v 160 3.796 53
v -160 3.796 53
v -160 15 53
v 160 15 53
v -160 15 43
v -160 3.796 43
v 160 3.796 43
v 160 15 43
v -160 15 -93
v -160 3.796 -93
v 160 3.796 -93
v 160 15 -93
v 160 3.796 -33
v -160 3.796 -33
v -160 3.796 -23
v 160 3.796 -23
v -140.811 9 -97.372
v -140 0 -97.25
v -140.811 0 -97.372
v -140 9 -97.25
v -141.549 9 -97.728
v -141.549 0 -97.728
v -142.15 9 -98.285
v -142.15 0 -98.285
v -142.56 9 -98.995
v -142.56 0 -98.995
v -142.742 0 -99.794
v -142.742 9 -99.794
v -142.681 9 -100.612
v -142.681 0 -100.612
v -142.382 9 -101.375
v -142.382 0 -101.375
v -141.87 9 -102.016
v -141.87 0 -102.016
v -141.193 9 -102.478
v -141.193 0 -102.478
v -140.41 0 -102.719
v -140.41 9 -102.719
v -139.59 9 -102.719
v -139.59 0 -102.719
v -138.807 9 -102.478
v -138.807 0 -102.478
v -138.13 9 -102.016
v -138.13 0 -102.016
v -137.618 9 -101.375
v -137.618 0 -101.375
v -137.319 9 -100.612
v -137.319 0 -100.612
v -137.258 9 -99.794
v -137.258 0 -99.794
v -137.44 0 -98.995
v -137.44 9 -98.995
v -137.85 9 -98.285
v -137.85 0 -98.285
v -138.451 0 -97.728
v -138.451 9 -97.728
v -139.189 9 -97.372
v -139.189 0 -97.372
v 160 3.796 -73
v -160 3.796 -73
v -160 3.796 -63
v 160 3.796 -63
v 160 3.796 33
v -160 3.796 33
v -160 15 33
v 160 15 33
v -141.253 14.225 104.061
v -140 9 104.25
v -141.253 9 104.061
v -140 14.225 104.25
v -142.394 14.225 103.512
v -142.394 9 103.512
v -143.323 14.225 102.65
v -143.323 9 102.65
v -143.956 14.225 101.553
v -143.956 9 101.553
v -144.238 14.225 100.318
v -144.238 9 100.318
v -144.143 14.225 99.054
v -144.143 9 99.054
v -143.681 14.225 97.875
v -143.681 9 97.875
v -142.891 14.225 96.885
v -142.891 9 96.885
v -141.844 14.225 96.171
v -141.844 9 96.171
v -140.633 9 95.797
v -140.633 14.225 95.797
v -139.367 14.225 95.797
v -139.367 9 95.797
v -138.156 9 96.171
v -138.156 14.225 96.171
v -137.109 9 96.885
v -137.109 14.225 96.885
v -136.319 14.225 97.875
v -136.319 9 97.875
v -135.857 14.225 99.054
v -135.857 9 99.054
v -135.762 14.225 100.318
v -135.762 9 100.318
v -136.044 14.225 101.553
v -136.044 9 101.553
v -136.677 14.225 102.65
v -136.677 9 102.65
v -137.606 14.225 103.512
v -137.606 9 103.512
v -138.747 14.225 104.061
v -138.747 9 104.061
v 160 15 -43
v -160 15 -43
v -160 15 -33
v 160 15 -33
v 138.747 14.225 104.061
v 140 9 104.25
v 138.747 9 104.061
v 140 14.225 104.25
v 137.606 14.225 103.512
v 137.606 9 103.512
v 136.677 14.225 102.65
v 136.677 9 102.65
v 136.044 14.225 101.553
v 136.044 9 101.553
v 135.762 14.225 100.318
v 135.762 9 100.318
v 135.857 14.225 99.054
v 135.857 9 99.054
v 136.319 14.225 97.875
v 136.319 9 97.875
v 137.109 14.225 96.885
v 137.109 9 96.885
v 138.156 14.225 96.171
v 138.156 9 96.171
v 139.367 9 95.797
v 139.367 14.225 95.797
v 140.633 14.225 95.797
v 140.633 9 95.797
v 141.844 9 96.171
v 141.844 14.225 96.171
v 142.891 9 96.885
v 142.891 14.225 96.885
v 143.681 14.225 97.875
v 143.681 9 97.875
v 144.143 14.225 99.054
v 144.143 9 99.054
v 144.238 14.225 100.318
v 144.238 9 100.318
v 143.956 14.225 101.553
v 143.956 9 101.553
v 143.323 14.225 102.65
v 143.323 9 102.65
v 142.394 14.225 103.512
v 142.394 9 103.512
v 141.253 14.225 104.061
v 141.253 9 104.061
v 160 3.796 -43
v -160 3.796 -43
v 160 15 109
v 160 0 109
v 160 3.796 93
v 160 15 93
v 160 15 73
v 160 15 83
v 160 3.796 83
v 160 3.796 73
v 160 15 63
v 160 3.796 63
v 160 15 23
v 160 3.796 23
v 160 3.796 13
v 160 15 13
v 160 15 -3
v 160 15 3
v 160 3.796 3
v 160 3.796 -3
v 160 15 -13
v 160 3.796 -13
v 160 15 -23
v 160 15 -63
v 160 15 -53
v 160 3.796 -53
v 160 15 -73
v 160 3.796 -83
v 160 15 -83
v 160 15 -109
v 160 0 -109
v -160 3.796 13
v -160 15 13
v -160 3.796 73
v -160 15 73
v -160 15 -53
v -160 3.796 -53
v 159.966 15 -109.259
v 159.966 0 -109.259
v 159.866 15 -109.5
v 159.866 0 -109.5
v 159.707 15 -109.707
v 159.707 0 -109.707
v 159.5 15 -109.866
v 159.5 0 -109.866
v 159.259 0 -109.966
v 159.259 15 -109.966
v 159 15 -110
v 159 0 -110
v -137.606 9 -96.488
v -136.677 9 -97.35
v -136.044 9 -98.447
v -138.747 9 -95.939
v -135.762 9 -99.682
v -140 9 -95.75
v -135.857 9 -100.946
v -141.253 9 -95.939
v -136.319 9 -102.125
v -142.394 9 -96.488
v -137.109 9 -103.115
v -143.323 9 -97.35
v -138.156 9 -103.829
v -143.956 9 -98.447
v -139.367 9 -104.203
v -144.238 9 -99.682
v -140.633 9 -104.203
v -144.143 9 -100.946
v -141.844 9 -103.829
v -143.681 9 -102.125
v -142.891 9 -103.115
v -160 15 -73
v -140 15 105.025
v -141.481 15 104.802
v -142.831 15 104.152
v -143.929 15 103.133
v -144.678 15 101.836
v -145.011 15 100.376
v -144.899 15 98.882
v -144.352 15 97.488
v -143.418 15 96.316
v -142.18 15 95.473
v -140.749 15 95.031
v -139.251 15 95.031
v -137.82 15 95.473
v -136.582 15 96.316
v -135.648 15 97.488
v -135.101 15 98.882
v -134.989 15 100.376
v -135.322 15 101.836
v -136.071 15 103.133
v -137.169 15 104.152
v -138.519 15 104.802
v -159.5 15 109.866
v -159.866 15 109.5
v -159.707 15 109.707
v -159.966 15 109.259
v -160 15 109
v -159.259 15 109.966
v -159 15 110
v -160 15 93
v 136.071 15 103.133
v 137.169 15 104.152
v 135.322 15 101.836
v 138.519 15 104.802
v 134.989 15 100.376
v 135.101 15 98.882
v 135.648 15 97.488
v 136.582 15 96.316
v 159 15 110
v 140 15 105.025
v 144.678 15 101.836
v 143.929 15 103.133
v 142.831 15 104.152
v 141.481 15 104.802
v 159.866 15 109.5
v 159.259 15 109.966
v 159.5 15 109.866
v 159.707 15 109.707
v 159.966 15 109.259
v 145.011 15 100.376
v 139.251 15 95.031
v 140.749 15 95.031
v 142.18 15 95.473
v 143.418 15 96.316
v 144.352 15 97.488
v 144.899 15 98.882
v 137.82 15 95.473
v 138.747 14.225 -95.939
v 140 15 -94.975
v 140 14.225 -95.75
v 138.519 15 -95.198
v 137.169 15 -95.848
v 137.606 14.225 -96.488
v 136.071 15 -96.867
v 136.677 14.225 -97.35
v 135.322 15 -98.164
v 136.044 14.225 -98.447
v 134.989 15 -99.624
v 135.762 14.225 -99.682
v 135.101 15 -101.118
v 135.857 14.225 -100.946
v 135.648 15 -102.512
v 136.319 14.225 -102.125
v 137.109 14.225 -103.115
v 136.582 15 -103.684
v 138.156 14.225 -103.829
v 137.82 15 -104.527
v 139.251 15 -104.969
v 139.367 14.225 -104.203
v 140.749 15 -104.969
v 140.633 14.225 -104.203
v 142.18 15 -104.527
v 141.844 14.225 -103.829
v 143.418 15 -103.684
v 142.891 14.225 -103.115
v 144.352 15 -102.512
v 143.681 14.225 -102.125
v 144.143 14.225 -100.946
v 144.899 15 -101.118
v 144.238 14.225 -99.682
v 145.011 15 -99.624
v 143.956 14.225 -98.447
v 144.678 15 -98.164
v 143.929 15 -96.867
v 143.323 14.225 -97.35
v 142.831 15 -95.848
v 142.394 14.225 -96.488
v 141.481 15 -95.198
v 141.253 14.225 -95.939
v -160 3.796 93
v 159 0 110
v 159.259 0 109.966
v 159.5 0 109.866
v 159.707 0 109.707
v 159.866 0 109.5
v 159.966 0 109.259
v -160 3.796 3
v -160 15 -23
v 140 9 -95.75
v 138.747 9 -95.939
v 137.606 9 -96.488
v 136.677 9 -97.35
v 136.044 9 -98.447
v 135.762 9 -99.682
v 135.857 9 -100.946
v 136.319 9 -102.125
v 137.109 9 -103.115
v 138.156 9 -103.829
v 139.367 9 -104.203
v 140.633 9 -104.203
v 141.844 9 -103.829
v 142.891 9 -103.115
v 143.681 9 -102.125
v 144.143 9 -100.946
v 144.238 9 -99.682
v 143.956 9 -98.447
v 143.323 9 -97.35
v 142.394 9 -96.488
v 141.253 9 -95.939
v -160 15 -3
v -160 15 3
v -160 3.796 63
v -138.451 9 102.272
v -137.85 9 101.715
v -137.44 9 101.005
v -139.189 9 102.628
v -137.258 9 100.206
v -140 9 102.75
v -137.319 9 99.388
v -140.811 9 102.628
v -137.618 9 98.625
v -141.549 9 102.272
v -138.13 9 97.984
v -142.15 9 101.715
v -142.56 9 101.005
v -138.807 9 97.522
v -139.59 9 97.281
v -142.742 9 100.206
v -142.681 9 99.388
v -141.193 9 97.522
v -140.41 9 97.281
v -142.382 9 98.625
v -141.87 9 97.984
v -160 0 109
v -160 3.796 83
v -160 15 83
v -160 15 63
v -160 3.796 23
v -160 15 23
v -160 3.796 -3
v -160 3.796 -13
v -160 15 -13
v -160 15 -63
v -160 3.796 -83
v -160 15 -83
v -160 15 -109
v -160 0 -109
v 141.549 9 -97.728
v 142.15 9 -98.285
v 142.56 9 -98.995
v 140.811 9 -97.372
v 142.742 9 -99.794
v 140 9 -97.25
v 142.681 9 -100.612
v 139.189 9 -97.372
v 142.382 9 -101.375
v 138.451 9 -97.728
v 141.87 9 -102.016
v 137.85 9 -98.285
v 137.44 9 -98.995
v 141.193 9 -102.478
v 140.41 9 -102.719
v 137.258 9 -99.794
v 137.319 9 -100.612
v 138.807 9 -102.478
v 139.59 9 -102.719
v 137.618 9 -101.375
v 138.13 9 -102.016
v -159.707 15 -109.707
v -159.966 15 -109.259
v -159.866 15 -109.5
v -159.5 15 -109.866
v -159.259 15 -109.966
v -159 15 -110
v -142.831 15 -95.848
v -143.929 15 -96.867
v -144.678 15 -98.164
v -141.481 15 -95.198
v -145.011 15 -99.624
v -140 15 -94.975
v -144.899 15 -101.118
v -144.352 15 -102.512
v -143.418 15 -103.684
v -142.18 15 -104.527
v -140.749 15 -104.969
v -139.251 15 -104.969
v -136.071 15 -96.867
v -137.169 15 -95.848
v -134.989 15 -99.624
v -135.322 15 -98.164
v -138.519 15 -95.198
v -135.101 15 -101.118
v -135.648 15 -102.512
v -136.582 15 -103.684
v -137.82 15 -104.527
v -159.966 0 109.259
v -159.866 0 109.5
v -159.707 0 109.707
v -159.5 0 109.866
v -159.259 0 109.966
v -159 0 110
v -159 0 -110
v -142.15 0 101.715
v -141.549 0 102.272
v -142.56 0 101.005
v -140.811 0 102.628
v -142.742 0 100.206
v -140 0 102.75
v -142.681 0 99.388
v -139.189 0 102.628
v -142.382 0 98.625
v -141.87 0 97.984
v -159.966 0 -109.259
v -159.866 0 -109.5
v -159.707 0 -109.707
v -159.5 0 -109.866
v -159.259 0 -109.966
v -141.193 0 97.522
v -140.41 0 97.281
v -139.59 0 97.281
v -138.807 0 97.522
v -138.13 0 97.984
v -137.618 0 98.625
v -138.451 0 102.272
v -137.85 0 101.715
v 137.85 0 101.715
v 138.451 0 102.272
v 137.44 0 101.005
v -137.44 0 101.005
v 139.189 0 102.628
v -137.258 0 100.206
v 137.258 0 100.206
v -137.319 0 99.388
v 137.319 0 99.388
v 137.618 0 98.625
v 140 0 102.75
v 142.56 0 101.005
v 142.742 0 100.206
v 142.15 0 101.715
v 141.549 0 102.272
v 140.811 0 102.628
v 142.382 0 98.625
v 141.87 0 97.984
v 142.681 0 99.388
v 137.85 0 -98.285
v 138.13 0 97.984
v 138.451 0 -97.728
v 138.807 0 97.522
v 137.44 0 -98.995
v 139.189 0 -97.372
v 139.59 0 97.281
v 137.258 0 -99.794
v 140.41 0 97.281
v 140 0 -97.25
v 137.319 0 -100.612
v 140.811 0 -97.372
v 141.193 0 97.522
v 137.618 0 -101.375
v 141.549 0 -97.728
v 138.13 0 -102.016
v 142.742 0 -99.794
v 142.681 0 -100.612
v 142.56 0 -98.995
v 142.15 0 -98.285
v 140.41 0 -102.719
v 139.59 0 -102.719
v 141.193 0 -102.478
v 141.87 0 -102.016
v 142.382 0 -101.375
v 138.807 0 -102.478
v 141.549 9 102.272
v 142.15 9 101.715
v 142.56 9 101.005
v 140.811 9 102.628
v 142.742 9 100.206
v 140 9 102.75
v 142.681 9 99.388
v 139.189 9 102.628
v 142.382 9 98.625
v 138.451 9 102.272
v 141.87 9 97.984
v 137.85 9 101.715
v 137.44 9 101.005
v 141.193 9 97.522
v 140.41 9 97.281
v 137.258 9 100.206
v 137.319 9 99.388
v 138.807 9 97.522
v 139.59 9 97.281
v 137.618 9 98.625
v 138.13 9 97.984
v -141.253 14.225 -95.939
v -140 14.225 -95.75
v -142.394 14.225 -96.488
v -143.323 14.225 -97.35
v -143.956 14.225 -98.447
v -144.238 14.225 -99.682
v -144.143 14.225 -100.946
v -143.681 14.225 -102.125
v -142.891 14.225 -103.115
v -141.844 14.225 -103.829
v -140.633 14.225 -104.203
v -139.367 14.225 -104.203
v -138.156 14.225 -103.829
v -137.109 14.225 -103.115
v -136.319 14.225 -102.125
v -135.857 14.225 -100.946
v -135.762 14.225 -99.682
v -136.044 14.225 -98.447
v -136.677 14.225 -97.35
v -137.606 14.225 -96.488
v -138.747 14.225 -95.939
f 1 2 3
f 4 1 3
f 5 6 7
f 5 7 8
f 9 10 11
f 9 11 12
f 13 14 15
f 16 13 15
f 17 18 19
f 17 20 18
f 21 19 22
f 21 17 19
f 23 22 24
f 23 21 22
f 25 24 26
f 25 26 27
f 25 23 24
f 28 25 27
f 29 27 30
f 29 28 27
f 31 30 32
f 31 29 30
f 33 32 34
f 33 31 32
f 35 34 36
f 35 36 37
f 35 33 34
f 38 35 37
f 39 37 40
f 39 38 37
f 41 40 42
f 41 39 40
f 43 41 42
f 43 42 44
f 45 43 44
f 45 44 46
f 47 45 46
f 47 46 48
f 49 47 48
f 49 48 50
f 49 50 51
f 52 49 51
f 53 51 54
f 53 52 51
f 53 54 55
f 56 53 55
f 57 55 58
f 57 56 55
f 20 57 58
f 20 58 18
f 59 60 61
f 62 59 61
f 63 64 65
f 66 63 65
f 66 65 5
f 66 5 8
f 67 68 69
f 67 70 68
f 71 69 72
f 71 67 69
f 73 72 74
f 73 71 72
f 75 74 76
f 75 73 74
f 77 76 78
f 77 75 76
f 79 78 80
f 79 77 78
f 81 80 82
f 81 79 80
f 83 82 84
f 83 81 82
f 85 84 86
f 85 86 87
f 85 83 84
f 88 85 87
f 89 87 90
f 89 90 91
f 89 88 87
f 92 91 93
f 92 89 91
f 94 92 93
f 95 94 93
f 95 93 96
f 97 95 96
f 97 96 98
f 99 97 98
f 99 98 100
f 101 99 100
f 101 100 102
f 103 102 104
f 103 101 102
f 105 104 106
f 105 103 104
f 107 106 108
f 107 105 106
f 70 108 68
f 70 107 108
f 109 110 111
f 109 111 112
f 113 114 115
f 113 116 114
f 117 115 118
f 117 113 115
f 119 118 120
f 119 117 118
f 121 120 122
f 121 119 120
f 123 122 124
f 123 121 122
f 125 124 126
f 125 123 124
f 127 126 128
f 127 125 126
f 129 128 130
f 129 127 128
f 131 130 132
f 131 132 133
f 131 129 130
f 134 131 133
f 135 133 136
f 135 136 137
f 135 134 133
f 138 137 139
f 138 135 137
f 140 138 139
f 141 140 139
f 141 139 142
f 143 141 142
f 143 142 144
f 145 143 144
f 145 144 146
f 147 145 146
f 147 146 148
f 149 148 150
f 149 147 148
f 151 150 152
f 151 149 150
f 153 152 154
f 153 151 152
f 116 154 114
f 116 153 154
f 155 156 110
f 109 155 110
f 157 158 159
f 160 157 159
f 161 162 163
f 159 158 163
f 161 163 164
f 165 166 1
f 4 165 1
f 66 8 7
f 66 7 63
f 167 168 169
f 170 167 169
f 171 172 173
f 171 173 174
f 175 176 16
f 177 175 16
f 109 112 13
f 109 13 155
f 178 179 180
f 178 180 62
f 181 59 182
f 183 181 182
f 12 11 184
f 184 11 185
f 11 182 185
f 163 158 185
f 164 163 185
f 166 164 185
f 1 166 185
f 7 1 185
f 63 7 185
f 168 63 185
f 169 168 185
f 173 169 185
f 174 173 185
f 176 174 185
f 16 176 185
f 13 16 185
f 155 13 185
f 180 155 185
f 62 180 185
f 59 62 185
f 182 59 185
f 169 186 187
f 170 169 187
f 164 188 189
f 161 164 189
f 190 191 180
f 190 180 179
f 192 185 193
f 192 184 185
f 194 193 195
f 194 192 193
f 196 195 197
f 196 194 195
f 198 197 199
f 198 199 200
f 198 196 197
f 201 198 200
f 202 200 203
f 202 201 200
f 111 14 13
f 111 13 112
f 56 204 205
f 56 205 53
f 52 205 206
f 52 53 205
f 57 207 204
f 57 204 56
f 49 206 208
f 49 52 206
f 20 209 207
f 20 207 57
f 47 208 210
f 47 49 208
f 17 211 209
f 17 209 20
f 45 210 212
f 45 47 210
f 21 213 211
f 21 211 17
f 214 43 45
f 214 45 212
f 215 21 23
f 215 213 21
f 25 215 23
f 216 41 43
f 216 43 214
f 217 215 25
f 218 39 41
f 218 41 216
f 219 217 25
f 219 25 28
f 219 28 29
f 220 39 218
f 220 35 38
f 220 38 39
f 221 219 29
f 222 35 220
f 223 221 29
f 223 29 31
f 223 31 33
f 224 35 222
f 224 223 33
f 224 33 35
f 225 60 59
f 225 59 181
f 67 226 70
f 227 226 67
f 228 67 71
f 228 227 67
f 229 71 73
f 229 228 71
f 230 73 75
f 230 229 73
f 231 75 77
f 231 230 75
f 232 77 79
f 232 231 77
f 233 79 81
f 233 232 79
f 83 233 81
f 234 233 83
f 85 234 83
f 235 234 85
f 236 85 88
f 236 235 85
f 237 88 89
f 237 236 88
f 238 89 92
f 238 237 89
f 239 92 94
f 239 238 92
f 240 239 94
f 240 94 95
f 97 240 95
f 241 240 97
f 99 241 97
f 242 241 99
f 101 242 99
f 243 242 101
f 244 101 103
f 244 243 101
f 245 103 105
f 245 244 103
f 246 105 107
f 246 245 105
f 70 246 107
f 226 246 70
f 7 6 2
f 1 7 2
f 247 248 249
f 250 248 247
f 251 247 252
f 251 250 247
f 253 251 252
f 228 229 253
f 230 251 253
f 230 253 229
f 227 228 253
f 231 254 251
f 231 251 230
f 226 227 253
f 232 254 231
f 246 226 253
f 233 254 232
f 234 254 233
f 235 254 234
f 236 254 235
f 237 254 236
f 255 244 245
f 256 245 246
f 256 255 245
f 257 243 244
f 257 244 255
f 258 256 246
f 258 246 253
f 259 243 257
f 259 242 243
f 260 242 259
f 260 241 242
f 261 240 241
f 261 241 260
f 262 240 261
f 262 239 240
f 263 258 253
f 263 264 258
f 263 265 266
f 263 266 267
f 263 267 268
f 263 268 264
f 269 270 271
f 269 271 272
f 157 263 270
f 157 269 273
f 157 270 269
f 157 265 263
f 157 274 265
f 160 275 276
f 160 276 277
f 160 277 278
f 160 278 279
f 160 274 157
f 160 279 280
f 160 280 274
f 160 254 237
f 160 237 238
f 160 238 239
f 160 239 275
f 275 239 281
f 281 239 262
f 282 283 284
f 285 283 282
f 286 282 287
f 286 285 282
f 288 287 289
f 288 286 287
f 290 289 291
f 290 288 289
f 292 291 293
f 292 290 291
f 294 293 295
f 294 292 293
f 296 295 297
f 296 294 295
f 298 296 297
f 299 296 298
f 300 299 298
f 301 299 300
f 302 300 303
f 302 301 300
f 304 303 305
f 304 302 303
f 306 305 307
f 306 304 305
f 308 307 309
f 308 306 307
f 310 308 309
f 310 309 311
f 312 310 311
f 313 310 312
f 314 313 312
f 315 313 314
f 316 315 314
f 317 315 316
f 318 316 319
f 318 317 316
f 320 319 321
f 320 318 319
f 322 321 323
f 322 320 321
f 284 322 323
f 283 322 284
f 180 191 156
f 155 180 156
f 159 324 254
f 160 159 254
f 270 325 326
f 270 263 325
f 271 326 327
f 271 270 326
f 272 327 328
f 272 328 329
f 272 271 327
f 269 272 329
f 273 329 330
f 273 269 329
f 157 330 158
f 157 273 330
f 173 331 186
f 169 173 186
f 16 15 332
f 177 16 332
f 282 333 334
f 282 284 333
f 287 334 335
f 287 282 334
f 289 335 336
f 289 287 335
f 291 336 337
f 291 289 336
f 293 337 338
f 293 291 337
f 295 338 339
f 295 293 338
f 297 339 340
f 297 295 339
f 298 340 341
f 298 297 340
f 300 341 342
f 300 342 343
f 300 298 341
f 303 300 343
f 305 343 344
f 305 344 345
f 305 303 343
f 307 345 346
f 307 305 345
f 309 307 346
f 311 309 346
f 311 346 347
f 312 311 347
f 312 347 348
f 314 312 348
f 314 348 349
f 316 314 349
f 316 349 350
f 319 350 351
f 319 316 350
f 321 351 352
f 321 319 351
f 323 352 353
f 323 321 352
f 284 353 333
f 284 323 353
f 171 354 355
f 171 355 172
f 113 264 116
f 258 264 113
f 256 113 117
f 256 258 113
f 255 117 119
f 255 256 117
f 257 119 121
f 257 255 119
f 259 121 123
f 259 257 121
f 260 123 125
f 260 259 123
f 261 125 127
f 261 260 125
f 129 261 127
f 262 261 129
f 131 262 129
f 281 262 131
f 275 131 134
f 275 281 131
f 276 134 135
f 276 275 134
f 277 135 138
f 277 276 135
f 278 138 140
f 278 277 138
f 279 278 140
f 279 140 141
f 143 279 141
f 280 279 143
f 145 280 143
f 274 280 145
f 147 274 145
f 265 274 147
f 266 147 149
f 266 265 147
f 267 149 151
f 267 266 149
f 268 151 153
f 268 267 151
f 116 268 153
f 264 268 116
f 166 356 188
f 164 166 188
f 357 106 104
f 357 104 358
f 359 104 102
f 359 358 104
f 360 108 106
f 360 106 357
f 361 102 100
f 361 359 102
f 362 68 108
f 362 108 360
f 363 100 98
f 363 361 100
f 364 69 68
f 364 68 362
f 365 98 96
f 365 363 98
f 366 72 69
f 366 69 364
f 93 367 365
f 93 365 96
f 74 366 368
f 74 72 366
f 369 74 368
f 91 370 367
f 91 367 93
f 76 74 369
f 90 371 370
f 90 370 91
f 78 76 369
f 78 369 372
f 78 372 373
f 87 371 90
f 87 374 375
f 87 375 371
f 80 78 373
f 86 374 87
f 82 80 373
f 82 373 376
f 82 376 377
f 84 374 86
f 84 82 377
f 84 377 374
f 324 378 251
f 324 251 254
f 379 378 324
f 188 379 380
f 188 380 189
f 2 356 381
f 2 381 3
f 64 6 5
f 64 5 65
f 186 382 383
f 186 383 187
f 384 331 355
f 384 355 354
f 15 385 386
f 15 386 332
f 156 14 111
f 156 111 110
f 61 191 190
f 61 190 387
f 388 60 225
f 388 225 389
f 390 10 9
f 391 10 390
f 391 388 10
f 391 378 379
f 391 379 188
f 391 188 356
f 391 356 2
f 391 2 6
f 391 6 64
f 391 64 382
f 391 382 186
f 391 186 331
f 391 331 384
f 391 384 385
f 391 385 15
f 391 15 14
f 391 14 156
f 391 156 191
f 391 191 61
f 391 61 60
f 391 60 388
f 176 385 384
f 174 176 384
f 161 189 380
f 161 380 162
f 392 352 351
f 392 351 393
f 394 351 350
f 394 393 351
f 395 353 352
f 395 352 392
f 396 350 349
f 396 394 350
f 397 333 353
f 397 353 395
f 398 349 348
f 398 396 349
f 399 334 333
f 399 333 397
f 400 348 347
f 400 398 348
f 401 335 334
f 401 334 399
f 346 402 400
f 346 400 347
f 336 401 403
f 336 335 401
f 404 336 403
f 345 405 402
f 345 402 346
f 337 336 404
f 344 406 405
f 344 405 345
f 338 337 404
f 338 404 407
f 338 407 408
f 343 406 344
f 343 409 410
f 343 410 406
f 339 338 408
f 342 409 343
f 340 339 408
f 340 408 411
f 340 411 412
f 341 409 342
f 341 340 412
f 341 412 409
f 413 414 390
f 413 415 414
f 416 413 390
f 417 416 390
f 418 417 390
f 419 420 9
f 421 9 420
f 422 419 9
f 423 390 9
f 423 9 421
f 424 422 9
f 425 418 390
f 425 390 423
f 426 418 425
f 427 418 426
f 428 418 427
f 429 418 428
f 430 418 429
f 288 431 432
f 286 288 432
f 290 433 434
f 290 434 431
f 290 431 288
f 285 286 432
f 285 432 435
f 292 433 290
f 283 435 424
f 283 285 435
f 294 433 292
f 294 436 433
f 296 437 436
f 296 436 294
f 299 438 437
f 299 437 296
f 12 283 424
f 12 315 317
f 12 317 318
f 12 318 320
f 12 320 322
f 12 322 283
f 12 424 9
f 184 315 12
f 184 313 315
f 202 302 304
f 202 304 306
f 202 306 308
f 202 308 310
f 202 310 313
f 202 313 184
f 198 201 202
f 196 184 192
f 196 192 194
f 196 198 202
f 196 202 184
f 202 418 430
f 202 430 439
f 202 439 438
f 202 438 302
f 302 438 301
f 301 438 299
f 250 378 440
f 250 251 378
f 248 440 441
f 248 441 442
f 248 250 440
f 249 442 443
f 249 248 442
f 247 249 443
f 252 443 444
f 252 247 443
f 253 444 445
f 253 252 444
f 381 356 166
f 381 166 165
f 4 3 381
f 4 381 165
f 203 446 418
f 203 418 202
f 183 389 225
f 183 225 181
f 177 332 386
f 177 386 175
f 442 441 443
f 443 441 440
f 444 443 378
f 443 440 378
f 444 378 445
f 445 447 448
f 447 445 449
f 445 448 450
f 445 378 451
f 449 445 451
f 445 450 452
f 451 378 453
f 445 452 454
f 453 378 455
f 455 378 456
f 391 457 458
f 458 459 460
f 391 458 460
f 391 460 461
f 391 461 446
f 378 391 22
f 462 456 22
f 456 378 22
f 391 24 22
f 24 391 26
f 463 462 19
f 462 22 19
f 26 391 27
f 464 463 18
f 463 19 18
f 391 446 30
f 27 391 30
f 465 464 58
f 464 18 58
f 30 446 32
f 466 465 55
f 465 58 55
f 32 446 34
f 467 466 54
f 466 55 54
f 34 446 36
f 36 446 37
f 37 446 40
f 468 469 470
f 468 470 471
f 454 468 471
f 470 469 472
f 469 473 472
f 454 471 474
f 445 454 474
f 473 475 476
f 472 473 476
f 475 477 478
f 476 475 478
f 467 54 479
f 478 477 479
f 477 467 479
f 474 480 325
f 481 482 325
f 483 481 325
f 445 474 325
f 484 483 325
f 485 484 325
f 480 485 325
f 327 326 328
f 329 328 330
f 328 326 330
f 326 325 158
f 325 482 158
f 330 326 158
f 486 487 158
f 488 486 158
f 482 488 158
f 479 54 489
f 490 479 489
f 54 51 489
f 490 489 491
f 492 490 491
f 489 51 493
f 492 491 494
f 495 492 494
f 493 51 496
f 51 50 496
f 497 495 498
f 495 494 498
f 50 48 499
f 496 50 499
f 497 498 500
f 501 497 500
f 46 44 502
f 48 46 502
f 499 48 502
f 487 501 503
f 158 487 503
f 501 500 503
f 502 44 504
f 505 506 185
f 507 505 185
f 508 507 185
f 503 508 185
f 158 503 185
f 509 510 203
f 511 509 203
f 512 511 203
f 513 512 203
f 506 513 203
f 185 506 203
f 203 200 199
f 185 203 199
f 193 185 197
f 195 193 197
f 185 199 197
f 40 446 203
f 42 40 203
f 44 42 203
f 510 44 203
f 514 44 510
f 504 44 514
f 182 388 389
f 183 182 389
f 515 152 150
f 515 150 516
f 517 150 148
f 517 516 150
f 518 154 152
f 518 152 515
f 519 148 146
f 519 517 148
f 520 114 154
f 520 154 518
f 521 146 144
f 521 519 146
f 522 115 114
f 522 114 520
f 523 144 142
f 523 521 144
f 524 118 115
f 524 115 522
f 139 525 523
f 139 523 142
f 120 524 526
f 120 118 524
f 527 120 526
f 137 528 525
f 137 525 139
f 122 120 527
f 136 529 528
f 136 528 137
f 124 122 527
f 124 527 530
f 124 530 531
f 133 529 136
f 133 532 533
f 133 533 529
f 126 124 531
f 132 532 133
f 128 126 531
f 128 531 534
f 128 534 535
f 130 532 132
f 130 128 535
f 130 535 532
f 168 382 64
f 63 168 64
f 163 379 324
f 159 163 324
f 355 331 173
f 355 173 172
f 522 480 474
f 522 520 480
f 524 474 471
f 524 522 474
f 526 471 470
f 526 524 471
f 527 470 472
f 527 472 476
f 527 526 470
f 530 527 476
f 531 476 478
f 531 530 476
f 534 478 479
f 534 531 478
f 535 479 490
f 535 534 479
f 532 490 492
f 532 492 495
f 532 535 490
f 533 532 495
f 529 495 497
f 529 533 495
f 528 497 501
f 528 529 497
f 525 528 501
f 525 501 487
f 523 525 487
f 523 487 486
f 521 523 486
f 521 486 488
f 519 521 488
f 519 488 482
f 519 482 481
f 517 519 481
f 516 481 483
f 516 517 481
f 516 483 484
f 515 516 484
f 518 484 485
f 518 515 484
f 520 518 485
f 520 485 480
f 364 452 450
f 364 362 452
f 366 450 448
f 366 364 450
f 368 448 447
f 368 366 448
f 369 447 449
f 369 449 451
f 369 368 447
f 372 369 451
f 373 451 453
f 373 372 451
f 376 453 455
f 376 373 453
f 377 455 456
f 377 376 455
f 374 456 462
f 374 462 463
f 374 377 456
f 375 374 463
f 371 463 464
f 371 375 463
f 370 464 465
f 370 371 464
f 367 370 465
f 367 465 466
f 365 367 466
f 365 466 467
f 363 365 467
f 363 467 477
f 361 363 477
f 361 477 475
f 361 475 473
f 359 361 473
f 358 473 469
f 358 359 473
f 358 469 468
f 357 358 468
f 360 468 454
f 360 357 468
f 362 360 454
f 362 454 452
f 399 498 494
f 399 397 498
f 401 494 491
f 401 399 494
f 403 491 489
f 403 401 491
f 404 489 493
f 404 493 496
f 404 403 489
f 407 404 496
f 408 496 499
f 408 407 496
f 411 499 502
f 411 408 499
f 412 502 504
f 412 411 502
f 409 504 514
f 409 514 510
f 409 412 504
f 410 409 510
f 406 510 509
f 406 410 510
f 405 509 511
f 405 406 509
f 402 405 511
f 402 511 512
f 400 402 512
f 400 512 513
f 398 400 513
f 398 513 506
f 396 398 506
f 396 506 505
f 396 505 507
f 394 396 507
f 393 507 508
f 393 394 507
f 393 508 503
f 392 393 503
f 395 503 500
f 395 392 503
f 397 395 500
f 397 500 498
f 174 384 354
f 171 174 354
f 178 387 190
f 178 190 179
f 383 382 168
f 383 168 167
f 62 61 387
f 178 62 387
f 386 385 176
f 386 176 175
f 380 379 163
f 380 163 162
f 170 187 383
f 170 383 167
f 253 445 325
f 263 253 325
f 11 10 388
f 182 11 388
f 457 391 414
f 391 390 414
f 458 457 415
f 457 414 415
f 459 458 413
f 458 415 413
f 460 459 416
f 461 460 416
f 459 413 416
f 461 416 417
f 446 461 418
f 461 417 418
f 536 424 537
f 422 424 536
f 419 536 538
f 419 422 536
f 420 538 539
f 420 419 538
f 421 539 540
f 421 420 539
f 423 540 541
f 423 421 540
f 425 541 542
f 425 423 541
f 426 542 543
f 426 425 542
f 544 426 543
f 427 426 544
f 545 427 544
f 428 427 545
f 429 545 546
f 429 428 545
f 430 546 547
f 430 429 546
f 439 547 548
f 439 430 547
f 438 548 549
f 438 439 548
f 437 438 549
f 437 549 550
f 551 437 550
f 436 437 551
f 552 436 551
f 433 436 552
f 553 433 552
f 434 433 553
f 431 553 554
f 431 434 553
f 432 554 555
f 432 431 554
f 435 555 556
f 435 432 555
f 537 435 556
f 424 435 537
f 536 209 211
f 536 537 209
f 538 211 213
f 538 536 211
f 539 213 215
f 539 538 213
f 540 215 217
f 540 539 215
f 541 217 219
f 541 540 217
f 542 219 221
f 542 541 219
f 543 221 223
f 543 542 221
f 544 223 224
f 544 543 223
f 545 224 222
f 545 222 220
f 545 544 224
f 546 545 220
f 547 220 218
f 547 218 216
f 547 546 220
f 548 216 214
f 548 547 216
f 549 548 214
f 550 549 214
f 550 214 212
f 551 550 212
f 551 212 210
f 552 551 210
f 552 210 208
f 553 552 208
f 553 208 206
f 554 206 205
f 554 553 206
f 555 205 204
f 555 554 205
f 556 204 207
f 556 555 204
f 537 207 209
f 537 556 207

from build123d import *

# Parameters (mm, degrees)
SKETCH1_W                                    = 320
SKETCH1_H                                    = 220
BOSS_EXTRUDE1_DEPTH                          = 15
FILLET2_R                                    = 1
CBORE_FOR_M5_HEX_SOCKET_HEAD_CAP_SCR_2_COUNT = 2
CBORE_FOR_M5_HEX_SOCKET_HEAD_CAP_SCR_2_PITCH = 200
CBORE_FOR_M5_HEX_SOCKET_HEAD_CAP_SCR_3_COUNT = 2
CBORE_FOR_M5_HEX_SOCKET_HEAD_CAP_SCR_3_PITCH = 344.093010682
CBORE_FOR_M5_HEX_SOCKET_HEAD_CAP_SCR_4_COUNT = 2
CBORE_FOR_M5_HEX_SOCKET_HEAD_CAP_SCR_4_PITCH = 280
SKETCH7_W                                    = 10
SKETCH7_H                                    = 11.203973801
CUT_EXTRUDE1_DEPTH                           = 321


with BuildPart() as part:
    # Sketch1 → Boss-Extrude1 (new body)
    with BuildSketch(Plane(origin=(0, 0, 0), x_dir=(1, 0, 0), z_dir=(0, 1, 0))):
        Rectangle(SKETCH1_W, SKETCH1_H)
    extrude(amount=BOSS_EXTRUDE1_DEPTH)

    # Fillet2
    fillet2_edges = [part.edges().sort_by_distance(p)[0] for p in [
        (-160, 7.5, -110),
        (160, 7.5, -110),
        (160, 7.5, 110),
        (-160, 7.5, 110),
    ]]
    fillet(fillet2_edges, radius=FILLET2_R)

    # Sketch5 → CBORE for M5 Hex Socket Head Cap Screw2 (revolve, cut)
    with BuildSketch(Plane(origin=(-140, 15, -100), x_dir=(0, 0, 1), z_dir=(1, 0, 0))):
        Polygon((0, 0), (0, 15), (2.75, 15), (2.75, 6), (4.25, 6), (4.25, 0.775), (5.025, 0), align=None)
    cbore_for_m5_hex_socket_head_cap_screw2 = revolve(axis=Axis((-140, 21.35, -100), (0, -1, 0)), mode=Mode.SUBTRACT)

    # CBORE for M5 Hex Socket Head Cap Scr 2: CBORE for M5 Hex Socket Head Cap Screw2 ×2
    with Locations(*[(0, 0, i * CBORE_FOR_M5_HEX_SOCKET_HEAD_CAP_SCR_2_PITCH) for i in range(1, CBORE_FOR_M5_HEX_SOCKET_HEAD_CAP_SCR_2_COUNT)]):
        add(cbore_for_m5_hex_socket_head_cap_screw2, mode=Mode.SUBTRACT)

    # CBORE for M5 Hex Socket Head Cap Scr 3: CBORE for M5 Hex Socket Head Cap Screw2 ×2
    with Locations(*[Vector(0.813733471, 0, 0.581238194) * (i * CBORE_FOR_M5_HEX_SOCKET_HEAD_CAP_SCR_3_PITCH) for i in range(1, CBORE_FOR_M5_HEX_SOCKET_HEAD_CAP_SCR_3_COUNT)]):
        add(cbore_for_m5_hex_socket_head_cap_screw2, mode=Mode.SUBTRACT)

    # CBORE for M5 Hex Socket Head Cap Scr 4: CBORE for M5 Hex Socket Head Cap Screw2 ×2
    with Locations(*[(i * CBORE_FOR_M5_HEX_SOCKET_HEAD_CAP_SCR_4_PITCH, 0, 0) for i in range(1, CBORE_FOR_M5_HEX_SOCKET_HEAD_CAP_SCR_4_COUNT)]):
        add(cbore_for_m5_hex_socket_head_cap_screw2, mode=Mode.SUBTRACT)

    # Sketch7 → Cut-Extrude1 (cut, through all)
    with BuildSketch(Plane.ZY.offset(160)):
        with Locations((-88, 9.3980131)):
            Rectangle(SKETCH7_W, SKETCH7_H)
        with Locations((8, 9.3980131)):
            Rectangle(SKETCH7_W, SKETCH7_H)
        with Locations((-68, 9.3980131)):
            Rectangle(SKETCH7_W, SKETCH7_H)
        with Locations((-48, 9.3980131)):
            Rectangle(SKETCH7_W, SKETCH7_H)
        with Locations((-28, 9.3980131)):
            Rectangle(SKETCH7_W, SKETCH7_H)
        with Locations((-8, 9.3980131)):
            Rectangle(SKETCH7_W, SKETCH7_H)
        with Locations((28, 9.3980131)):
            Rectangle(SKETCH7_W, SKETCH7_H)
        with Locations((48, 9.3980131)):
            Rectangle(SKETCH7_W, SKETCH7_H)
        with Locations((68, 9.3980131)):
            Rectangle(SKETCH7_W, SKETCH7_H)
        with Locations((88, 9.3980131)):
            Rectangle(SKETCH7_W, SKETCH7_H)
    extrude(amount=-CUT_EXTRUDE1_DEPTH, mode=Mode.SUBTRACT)


solid = part.part
